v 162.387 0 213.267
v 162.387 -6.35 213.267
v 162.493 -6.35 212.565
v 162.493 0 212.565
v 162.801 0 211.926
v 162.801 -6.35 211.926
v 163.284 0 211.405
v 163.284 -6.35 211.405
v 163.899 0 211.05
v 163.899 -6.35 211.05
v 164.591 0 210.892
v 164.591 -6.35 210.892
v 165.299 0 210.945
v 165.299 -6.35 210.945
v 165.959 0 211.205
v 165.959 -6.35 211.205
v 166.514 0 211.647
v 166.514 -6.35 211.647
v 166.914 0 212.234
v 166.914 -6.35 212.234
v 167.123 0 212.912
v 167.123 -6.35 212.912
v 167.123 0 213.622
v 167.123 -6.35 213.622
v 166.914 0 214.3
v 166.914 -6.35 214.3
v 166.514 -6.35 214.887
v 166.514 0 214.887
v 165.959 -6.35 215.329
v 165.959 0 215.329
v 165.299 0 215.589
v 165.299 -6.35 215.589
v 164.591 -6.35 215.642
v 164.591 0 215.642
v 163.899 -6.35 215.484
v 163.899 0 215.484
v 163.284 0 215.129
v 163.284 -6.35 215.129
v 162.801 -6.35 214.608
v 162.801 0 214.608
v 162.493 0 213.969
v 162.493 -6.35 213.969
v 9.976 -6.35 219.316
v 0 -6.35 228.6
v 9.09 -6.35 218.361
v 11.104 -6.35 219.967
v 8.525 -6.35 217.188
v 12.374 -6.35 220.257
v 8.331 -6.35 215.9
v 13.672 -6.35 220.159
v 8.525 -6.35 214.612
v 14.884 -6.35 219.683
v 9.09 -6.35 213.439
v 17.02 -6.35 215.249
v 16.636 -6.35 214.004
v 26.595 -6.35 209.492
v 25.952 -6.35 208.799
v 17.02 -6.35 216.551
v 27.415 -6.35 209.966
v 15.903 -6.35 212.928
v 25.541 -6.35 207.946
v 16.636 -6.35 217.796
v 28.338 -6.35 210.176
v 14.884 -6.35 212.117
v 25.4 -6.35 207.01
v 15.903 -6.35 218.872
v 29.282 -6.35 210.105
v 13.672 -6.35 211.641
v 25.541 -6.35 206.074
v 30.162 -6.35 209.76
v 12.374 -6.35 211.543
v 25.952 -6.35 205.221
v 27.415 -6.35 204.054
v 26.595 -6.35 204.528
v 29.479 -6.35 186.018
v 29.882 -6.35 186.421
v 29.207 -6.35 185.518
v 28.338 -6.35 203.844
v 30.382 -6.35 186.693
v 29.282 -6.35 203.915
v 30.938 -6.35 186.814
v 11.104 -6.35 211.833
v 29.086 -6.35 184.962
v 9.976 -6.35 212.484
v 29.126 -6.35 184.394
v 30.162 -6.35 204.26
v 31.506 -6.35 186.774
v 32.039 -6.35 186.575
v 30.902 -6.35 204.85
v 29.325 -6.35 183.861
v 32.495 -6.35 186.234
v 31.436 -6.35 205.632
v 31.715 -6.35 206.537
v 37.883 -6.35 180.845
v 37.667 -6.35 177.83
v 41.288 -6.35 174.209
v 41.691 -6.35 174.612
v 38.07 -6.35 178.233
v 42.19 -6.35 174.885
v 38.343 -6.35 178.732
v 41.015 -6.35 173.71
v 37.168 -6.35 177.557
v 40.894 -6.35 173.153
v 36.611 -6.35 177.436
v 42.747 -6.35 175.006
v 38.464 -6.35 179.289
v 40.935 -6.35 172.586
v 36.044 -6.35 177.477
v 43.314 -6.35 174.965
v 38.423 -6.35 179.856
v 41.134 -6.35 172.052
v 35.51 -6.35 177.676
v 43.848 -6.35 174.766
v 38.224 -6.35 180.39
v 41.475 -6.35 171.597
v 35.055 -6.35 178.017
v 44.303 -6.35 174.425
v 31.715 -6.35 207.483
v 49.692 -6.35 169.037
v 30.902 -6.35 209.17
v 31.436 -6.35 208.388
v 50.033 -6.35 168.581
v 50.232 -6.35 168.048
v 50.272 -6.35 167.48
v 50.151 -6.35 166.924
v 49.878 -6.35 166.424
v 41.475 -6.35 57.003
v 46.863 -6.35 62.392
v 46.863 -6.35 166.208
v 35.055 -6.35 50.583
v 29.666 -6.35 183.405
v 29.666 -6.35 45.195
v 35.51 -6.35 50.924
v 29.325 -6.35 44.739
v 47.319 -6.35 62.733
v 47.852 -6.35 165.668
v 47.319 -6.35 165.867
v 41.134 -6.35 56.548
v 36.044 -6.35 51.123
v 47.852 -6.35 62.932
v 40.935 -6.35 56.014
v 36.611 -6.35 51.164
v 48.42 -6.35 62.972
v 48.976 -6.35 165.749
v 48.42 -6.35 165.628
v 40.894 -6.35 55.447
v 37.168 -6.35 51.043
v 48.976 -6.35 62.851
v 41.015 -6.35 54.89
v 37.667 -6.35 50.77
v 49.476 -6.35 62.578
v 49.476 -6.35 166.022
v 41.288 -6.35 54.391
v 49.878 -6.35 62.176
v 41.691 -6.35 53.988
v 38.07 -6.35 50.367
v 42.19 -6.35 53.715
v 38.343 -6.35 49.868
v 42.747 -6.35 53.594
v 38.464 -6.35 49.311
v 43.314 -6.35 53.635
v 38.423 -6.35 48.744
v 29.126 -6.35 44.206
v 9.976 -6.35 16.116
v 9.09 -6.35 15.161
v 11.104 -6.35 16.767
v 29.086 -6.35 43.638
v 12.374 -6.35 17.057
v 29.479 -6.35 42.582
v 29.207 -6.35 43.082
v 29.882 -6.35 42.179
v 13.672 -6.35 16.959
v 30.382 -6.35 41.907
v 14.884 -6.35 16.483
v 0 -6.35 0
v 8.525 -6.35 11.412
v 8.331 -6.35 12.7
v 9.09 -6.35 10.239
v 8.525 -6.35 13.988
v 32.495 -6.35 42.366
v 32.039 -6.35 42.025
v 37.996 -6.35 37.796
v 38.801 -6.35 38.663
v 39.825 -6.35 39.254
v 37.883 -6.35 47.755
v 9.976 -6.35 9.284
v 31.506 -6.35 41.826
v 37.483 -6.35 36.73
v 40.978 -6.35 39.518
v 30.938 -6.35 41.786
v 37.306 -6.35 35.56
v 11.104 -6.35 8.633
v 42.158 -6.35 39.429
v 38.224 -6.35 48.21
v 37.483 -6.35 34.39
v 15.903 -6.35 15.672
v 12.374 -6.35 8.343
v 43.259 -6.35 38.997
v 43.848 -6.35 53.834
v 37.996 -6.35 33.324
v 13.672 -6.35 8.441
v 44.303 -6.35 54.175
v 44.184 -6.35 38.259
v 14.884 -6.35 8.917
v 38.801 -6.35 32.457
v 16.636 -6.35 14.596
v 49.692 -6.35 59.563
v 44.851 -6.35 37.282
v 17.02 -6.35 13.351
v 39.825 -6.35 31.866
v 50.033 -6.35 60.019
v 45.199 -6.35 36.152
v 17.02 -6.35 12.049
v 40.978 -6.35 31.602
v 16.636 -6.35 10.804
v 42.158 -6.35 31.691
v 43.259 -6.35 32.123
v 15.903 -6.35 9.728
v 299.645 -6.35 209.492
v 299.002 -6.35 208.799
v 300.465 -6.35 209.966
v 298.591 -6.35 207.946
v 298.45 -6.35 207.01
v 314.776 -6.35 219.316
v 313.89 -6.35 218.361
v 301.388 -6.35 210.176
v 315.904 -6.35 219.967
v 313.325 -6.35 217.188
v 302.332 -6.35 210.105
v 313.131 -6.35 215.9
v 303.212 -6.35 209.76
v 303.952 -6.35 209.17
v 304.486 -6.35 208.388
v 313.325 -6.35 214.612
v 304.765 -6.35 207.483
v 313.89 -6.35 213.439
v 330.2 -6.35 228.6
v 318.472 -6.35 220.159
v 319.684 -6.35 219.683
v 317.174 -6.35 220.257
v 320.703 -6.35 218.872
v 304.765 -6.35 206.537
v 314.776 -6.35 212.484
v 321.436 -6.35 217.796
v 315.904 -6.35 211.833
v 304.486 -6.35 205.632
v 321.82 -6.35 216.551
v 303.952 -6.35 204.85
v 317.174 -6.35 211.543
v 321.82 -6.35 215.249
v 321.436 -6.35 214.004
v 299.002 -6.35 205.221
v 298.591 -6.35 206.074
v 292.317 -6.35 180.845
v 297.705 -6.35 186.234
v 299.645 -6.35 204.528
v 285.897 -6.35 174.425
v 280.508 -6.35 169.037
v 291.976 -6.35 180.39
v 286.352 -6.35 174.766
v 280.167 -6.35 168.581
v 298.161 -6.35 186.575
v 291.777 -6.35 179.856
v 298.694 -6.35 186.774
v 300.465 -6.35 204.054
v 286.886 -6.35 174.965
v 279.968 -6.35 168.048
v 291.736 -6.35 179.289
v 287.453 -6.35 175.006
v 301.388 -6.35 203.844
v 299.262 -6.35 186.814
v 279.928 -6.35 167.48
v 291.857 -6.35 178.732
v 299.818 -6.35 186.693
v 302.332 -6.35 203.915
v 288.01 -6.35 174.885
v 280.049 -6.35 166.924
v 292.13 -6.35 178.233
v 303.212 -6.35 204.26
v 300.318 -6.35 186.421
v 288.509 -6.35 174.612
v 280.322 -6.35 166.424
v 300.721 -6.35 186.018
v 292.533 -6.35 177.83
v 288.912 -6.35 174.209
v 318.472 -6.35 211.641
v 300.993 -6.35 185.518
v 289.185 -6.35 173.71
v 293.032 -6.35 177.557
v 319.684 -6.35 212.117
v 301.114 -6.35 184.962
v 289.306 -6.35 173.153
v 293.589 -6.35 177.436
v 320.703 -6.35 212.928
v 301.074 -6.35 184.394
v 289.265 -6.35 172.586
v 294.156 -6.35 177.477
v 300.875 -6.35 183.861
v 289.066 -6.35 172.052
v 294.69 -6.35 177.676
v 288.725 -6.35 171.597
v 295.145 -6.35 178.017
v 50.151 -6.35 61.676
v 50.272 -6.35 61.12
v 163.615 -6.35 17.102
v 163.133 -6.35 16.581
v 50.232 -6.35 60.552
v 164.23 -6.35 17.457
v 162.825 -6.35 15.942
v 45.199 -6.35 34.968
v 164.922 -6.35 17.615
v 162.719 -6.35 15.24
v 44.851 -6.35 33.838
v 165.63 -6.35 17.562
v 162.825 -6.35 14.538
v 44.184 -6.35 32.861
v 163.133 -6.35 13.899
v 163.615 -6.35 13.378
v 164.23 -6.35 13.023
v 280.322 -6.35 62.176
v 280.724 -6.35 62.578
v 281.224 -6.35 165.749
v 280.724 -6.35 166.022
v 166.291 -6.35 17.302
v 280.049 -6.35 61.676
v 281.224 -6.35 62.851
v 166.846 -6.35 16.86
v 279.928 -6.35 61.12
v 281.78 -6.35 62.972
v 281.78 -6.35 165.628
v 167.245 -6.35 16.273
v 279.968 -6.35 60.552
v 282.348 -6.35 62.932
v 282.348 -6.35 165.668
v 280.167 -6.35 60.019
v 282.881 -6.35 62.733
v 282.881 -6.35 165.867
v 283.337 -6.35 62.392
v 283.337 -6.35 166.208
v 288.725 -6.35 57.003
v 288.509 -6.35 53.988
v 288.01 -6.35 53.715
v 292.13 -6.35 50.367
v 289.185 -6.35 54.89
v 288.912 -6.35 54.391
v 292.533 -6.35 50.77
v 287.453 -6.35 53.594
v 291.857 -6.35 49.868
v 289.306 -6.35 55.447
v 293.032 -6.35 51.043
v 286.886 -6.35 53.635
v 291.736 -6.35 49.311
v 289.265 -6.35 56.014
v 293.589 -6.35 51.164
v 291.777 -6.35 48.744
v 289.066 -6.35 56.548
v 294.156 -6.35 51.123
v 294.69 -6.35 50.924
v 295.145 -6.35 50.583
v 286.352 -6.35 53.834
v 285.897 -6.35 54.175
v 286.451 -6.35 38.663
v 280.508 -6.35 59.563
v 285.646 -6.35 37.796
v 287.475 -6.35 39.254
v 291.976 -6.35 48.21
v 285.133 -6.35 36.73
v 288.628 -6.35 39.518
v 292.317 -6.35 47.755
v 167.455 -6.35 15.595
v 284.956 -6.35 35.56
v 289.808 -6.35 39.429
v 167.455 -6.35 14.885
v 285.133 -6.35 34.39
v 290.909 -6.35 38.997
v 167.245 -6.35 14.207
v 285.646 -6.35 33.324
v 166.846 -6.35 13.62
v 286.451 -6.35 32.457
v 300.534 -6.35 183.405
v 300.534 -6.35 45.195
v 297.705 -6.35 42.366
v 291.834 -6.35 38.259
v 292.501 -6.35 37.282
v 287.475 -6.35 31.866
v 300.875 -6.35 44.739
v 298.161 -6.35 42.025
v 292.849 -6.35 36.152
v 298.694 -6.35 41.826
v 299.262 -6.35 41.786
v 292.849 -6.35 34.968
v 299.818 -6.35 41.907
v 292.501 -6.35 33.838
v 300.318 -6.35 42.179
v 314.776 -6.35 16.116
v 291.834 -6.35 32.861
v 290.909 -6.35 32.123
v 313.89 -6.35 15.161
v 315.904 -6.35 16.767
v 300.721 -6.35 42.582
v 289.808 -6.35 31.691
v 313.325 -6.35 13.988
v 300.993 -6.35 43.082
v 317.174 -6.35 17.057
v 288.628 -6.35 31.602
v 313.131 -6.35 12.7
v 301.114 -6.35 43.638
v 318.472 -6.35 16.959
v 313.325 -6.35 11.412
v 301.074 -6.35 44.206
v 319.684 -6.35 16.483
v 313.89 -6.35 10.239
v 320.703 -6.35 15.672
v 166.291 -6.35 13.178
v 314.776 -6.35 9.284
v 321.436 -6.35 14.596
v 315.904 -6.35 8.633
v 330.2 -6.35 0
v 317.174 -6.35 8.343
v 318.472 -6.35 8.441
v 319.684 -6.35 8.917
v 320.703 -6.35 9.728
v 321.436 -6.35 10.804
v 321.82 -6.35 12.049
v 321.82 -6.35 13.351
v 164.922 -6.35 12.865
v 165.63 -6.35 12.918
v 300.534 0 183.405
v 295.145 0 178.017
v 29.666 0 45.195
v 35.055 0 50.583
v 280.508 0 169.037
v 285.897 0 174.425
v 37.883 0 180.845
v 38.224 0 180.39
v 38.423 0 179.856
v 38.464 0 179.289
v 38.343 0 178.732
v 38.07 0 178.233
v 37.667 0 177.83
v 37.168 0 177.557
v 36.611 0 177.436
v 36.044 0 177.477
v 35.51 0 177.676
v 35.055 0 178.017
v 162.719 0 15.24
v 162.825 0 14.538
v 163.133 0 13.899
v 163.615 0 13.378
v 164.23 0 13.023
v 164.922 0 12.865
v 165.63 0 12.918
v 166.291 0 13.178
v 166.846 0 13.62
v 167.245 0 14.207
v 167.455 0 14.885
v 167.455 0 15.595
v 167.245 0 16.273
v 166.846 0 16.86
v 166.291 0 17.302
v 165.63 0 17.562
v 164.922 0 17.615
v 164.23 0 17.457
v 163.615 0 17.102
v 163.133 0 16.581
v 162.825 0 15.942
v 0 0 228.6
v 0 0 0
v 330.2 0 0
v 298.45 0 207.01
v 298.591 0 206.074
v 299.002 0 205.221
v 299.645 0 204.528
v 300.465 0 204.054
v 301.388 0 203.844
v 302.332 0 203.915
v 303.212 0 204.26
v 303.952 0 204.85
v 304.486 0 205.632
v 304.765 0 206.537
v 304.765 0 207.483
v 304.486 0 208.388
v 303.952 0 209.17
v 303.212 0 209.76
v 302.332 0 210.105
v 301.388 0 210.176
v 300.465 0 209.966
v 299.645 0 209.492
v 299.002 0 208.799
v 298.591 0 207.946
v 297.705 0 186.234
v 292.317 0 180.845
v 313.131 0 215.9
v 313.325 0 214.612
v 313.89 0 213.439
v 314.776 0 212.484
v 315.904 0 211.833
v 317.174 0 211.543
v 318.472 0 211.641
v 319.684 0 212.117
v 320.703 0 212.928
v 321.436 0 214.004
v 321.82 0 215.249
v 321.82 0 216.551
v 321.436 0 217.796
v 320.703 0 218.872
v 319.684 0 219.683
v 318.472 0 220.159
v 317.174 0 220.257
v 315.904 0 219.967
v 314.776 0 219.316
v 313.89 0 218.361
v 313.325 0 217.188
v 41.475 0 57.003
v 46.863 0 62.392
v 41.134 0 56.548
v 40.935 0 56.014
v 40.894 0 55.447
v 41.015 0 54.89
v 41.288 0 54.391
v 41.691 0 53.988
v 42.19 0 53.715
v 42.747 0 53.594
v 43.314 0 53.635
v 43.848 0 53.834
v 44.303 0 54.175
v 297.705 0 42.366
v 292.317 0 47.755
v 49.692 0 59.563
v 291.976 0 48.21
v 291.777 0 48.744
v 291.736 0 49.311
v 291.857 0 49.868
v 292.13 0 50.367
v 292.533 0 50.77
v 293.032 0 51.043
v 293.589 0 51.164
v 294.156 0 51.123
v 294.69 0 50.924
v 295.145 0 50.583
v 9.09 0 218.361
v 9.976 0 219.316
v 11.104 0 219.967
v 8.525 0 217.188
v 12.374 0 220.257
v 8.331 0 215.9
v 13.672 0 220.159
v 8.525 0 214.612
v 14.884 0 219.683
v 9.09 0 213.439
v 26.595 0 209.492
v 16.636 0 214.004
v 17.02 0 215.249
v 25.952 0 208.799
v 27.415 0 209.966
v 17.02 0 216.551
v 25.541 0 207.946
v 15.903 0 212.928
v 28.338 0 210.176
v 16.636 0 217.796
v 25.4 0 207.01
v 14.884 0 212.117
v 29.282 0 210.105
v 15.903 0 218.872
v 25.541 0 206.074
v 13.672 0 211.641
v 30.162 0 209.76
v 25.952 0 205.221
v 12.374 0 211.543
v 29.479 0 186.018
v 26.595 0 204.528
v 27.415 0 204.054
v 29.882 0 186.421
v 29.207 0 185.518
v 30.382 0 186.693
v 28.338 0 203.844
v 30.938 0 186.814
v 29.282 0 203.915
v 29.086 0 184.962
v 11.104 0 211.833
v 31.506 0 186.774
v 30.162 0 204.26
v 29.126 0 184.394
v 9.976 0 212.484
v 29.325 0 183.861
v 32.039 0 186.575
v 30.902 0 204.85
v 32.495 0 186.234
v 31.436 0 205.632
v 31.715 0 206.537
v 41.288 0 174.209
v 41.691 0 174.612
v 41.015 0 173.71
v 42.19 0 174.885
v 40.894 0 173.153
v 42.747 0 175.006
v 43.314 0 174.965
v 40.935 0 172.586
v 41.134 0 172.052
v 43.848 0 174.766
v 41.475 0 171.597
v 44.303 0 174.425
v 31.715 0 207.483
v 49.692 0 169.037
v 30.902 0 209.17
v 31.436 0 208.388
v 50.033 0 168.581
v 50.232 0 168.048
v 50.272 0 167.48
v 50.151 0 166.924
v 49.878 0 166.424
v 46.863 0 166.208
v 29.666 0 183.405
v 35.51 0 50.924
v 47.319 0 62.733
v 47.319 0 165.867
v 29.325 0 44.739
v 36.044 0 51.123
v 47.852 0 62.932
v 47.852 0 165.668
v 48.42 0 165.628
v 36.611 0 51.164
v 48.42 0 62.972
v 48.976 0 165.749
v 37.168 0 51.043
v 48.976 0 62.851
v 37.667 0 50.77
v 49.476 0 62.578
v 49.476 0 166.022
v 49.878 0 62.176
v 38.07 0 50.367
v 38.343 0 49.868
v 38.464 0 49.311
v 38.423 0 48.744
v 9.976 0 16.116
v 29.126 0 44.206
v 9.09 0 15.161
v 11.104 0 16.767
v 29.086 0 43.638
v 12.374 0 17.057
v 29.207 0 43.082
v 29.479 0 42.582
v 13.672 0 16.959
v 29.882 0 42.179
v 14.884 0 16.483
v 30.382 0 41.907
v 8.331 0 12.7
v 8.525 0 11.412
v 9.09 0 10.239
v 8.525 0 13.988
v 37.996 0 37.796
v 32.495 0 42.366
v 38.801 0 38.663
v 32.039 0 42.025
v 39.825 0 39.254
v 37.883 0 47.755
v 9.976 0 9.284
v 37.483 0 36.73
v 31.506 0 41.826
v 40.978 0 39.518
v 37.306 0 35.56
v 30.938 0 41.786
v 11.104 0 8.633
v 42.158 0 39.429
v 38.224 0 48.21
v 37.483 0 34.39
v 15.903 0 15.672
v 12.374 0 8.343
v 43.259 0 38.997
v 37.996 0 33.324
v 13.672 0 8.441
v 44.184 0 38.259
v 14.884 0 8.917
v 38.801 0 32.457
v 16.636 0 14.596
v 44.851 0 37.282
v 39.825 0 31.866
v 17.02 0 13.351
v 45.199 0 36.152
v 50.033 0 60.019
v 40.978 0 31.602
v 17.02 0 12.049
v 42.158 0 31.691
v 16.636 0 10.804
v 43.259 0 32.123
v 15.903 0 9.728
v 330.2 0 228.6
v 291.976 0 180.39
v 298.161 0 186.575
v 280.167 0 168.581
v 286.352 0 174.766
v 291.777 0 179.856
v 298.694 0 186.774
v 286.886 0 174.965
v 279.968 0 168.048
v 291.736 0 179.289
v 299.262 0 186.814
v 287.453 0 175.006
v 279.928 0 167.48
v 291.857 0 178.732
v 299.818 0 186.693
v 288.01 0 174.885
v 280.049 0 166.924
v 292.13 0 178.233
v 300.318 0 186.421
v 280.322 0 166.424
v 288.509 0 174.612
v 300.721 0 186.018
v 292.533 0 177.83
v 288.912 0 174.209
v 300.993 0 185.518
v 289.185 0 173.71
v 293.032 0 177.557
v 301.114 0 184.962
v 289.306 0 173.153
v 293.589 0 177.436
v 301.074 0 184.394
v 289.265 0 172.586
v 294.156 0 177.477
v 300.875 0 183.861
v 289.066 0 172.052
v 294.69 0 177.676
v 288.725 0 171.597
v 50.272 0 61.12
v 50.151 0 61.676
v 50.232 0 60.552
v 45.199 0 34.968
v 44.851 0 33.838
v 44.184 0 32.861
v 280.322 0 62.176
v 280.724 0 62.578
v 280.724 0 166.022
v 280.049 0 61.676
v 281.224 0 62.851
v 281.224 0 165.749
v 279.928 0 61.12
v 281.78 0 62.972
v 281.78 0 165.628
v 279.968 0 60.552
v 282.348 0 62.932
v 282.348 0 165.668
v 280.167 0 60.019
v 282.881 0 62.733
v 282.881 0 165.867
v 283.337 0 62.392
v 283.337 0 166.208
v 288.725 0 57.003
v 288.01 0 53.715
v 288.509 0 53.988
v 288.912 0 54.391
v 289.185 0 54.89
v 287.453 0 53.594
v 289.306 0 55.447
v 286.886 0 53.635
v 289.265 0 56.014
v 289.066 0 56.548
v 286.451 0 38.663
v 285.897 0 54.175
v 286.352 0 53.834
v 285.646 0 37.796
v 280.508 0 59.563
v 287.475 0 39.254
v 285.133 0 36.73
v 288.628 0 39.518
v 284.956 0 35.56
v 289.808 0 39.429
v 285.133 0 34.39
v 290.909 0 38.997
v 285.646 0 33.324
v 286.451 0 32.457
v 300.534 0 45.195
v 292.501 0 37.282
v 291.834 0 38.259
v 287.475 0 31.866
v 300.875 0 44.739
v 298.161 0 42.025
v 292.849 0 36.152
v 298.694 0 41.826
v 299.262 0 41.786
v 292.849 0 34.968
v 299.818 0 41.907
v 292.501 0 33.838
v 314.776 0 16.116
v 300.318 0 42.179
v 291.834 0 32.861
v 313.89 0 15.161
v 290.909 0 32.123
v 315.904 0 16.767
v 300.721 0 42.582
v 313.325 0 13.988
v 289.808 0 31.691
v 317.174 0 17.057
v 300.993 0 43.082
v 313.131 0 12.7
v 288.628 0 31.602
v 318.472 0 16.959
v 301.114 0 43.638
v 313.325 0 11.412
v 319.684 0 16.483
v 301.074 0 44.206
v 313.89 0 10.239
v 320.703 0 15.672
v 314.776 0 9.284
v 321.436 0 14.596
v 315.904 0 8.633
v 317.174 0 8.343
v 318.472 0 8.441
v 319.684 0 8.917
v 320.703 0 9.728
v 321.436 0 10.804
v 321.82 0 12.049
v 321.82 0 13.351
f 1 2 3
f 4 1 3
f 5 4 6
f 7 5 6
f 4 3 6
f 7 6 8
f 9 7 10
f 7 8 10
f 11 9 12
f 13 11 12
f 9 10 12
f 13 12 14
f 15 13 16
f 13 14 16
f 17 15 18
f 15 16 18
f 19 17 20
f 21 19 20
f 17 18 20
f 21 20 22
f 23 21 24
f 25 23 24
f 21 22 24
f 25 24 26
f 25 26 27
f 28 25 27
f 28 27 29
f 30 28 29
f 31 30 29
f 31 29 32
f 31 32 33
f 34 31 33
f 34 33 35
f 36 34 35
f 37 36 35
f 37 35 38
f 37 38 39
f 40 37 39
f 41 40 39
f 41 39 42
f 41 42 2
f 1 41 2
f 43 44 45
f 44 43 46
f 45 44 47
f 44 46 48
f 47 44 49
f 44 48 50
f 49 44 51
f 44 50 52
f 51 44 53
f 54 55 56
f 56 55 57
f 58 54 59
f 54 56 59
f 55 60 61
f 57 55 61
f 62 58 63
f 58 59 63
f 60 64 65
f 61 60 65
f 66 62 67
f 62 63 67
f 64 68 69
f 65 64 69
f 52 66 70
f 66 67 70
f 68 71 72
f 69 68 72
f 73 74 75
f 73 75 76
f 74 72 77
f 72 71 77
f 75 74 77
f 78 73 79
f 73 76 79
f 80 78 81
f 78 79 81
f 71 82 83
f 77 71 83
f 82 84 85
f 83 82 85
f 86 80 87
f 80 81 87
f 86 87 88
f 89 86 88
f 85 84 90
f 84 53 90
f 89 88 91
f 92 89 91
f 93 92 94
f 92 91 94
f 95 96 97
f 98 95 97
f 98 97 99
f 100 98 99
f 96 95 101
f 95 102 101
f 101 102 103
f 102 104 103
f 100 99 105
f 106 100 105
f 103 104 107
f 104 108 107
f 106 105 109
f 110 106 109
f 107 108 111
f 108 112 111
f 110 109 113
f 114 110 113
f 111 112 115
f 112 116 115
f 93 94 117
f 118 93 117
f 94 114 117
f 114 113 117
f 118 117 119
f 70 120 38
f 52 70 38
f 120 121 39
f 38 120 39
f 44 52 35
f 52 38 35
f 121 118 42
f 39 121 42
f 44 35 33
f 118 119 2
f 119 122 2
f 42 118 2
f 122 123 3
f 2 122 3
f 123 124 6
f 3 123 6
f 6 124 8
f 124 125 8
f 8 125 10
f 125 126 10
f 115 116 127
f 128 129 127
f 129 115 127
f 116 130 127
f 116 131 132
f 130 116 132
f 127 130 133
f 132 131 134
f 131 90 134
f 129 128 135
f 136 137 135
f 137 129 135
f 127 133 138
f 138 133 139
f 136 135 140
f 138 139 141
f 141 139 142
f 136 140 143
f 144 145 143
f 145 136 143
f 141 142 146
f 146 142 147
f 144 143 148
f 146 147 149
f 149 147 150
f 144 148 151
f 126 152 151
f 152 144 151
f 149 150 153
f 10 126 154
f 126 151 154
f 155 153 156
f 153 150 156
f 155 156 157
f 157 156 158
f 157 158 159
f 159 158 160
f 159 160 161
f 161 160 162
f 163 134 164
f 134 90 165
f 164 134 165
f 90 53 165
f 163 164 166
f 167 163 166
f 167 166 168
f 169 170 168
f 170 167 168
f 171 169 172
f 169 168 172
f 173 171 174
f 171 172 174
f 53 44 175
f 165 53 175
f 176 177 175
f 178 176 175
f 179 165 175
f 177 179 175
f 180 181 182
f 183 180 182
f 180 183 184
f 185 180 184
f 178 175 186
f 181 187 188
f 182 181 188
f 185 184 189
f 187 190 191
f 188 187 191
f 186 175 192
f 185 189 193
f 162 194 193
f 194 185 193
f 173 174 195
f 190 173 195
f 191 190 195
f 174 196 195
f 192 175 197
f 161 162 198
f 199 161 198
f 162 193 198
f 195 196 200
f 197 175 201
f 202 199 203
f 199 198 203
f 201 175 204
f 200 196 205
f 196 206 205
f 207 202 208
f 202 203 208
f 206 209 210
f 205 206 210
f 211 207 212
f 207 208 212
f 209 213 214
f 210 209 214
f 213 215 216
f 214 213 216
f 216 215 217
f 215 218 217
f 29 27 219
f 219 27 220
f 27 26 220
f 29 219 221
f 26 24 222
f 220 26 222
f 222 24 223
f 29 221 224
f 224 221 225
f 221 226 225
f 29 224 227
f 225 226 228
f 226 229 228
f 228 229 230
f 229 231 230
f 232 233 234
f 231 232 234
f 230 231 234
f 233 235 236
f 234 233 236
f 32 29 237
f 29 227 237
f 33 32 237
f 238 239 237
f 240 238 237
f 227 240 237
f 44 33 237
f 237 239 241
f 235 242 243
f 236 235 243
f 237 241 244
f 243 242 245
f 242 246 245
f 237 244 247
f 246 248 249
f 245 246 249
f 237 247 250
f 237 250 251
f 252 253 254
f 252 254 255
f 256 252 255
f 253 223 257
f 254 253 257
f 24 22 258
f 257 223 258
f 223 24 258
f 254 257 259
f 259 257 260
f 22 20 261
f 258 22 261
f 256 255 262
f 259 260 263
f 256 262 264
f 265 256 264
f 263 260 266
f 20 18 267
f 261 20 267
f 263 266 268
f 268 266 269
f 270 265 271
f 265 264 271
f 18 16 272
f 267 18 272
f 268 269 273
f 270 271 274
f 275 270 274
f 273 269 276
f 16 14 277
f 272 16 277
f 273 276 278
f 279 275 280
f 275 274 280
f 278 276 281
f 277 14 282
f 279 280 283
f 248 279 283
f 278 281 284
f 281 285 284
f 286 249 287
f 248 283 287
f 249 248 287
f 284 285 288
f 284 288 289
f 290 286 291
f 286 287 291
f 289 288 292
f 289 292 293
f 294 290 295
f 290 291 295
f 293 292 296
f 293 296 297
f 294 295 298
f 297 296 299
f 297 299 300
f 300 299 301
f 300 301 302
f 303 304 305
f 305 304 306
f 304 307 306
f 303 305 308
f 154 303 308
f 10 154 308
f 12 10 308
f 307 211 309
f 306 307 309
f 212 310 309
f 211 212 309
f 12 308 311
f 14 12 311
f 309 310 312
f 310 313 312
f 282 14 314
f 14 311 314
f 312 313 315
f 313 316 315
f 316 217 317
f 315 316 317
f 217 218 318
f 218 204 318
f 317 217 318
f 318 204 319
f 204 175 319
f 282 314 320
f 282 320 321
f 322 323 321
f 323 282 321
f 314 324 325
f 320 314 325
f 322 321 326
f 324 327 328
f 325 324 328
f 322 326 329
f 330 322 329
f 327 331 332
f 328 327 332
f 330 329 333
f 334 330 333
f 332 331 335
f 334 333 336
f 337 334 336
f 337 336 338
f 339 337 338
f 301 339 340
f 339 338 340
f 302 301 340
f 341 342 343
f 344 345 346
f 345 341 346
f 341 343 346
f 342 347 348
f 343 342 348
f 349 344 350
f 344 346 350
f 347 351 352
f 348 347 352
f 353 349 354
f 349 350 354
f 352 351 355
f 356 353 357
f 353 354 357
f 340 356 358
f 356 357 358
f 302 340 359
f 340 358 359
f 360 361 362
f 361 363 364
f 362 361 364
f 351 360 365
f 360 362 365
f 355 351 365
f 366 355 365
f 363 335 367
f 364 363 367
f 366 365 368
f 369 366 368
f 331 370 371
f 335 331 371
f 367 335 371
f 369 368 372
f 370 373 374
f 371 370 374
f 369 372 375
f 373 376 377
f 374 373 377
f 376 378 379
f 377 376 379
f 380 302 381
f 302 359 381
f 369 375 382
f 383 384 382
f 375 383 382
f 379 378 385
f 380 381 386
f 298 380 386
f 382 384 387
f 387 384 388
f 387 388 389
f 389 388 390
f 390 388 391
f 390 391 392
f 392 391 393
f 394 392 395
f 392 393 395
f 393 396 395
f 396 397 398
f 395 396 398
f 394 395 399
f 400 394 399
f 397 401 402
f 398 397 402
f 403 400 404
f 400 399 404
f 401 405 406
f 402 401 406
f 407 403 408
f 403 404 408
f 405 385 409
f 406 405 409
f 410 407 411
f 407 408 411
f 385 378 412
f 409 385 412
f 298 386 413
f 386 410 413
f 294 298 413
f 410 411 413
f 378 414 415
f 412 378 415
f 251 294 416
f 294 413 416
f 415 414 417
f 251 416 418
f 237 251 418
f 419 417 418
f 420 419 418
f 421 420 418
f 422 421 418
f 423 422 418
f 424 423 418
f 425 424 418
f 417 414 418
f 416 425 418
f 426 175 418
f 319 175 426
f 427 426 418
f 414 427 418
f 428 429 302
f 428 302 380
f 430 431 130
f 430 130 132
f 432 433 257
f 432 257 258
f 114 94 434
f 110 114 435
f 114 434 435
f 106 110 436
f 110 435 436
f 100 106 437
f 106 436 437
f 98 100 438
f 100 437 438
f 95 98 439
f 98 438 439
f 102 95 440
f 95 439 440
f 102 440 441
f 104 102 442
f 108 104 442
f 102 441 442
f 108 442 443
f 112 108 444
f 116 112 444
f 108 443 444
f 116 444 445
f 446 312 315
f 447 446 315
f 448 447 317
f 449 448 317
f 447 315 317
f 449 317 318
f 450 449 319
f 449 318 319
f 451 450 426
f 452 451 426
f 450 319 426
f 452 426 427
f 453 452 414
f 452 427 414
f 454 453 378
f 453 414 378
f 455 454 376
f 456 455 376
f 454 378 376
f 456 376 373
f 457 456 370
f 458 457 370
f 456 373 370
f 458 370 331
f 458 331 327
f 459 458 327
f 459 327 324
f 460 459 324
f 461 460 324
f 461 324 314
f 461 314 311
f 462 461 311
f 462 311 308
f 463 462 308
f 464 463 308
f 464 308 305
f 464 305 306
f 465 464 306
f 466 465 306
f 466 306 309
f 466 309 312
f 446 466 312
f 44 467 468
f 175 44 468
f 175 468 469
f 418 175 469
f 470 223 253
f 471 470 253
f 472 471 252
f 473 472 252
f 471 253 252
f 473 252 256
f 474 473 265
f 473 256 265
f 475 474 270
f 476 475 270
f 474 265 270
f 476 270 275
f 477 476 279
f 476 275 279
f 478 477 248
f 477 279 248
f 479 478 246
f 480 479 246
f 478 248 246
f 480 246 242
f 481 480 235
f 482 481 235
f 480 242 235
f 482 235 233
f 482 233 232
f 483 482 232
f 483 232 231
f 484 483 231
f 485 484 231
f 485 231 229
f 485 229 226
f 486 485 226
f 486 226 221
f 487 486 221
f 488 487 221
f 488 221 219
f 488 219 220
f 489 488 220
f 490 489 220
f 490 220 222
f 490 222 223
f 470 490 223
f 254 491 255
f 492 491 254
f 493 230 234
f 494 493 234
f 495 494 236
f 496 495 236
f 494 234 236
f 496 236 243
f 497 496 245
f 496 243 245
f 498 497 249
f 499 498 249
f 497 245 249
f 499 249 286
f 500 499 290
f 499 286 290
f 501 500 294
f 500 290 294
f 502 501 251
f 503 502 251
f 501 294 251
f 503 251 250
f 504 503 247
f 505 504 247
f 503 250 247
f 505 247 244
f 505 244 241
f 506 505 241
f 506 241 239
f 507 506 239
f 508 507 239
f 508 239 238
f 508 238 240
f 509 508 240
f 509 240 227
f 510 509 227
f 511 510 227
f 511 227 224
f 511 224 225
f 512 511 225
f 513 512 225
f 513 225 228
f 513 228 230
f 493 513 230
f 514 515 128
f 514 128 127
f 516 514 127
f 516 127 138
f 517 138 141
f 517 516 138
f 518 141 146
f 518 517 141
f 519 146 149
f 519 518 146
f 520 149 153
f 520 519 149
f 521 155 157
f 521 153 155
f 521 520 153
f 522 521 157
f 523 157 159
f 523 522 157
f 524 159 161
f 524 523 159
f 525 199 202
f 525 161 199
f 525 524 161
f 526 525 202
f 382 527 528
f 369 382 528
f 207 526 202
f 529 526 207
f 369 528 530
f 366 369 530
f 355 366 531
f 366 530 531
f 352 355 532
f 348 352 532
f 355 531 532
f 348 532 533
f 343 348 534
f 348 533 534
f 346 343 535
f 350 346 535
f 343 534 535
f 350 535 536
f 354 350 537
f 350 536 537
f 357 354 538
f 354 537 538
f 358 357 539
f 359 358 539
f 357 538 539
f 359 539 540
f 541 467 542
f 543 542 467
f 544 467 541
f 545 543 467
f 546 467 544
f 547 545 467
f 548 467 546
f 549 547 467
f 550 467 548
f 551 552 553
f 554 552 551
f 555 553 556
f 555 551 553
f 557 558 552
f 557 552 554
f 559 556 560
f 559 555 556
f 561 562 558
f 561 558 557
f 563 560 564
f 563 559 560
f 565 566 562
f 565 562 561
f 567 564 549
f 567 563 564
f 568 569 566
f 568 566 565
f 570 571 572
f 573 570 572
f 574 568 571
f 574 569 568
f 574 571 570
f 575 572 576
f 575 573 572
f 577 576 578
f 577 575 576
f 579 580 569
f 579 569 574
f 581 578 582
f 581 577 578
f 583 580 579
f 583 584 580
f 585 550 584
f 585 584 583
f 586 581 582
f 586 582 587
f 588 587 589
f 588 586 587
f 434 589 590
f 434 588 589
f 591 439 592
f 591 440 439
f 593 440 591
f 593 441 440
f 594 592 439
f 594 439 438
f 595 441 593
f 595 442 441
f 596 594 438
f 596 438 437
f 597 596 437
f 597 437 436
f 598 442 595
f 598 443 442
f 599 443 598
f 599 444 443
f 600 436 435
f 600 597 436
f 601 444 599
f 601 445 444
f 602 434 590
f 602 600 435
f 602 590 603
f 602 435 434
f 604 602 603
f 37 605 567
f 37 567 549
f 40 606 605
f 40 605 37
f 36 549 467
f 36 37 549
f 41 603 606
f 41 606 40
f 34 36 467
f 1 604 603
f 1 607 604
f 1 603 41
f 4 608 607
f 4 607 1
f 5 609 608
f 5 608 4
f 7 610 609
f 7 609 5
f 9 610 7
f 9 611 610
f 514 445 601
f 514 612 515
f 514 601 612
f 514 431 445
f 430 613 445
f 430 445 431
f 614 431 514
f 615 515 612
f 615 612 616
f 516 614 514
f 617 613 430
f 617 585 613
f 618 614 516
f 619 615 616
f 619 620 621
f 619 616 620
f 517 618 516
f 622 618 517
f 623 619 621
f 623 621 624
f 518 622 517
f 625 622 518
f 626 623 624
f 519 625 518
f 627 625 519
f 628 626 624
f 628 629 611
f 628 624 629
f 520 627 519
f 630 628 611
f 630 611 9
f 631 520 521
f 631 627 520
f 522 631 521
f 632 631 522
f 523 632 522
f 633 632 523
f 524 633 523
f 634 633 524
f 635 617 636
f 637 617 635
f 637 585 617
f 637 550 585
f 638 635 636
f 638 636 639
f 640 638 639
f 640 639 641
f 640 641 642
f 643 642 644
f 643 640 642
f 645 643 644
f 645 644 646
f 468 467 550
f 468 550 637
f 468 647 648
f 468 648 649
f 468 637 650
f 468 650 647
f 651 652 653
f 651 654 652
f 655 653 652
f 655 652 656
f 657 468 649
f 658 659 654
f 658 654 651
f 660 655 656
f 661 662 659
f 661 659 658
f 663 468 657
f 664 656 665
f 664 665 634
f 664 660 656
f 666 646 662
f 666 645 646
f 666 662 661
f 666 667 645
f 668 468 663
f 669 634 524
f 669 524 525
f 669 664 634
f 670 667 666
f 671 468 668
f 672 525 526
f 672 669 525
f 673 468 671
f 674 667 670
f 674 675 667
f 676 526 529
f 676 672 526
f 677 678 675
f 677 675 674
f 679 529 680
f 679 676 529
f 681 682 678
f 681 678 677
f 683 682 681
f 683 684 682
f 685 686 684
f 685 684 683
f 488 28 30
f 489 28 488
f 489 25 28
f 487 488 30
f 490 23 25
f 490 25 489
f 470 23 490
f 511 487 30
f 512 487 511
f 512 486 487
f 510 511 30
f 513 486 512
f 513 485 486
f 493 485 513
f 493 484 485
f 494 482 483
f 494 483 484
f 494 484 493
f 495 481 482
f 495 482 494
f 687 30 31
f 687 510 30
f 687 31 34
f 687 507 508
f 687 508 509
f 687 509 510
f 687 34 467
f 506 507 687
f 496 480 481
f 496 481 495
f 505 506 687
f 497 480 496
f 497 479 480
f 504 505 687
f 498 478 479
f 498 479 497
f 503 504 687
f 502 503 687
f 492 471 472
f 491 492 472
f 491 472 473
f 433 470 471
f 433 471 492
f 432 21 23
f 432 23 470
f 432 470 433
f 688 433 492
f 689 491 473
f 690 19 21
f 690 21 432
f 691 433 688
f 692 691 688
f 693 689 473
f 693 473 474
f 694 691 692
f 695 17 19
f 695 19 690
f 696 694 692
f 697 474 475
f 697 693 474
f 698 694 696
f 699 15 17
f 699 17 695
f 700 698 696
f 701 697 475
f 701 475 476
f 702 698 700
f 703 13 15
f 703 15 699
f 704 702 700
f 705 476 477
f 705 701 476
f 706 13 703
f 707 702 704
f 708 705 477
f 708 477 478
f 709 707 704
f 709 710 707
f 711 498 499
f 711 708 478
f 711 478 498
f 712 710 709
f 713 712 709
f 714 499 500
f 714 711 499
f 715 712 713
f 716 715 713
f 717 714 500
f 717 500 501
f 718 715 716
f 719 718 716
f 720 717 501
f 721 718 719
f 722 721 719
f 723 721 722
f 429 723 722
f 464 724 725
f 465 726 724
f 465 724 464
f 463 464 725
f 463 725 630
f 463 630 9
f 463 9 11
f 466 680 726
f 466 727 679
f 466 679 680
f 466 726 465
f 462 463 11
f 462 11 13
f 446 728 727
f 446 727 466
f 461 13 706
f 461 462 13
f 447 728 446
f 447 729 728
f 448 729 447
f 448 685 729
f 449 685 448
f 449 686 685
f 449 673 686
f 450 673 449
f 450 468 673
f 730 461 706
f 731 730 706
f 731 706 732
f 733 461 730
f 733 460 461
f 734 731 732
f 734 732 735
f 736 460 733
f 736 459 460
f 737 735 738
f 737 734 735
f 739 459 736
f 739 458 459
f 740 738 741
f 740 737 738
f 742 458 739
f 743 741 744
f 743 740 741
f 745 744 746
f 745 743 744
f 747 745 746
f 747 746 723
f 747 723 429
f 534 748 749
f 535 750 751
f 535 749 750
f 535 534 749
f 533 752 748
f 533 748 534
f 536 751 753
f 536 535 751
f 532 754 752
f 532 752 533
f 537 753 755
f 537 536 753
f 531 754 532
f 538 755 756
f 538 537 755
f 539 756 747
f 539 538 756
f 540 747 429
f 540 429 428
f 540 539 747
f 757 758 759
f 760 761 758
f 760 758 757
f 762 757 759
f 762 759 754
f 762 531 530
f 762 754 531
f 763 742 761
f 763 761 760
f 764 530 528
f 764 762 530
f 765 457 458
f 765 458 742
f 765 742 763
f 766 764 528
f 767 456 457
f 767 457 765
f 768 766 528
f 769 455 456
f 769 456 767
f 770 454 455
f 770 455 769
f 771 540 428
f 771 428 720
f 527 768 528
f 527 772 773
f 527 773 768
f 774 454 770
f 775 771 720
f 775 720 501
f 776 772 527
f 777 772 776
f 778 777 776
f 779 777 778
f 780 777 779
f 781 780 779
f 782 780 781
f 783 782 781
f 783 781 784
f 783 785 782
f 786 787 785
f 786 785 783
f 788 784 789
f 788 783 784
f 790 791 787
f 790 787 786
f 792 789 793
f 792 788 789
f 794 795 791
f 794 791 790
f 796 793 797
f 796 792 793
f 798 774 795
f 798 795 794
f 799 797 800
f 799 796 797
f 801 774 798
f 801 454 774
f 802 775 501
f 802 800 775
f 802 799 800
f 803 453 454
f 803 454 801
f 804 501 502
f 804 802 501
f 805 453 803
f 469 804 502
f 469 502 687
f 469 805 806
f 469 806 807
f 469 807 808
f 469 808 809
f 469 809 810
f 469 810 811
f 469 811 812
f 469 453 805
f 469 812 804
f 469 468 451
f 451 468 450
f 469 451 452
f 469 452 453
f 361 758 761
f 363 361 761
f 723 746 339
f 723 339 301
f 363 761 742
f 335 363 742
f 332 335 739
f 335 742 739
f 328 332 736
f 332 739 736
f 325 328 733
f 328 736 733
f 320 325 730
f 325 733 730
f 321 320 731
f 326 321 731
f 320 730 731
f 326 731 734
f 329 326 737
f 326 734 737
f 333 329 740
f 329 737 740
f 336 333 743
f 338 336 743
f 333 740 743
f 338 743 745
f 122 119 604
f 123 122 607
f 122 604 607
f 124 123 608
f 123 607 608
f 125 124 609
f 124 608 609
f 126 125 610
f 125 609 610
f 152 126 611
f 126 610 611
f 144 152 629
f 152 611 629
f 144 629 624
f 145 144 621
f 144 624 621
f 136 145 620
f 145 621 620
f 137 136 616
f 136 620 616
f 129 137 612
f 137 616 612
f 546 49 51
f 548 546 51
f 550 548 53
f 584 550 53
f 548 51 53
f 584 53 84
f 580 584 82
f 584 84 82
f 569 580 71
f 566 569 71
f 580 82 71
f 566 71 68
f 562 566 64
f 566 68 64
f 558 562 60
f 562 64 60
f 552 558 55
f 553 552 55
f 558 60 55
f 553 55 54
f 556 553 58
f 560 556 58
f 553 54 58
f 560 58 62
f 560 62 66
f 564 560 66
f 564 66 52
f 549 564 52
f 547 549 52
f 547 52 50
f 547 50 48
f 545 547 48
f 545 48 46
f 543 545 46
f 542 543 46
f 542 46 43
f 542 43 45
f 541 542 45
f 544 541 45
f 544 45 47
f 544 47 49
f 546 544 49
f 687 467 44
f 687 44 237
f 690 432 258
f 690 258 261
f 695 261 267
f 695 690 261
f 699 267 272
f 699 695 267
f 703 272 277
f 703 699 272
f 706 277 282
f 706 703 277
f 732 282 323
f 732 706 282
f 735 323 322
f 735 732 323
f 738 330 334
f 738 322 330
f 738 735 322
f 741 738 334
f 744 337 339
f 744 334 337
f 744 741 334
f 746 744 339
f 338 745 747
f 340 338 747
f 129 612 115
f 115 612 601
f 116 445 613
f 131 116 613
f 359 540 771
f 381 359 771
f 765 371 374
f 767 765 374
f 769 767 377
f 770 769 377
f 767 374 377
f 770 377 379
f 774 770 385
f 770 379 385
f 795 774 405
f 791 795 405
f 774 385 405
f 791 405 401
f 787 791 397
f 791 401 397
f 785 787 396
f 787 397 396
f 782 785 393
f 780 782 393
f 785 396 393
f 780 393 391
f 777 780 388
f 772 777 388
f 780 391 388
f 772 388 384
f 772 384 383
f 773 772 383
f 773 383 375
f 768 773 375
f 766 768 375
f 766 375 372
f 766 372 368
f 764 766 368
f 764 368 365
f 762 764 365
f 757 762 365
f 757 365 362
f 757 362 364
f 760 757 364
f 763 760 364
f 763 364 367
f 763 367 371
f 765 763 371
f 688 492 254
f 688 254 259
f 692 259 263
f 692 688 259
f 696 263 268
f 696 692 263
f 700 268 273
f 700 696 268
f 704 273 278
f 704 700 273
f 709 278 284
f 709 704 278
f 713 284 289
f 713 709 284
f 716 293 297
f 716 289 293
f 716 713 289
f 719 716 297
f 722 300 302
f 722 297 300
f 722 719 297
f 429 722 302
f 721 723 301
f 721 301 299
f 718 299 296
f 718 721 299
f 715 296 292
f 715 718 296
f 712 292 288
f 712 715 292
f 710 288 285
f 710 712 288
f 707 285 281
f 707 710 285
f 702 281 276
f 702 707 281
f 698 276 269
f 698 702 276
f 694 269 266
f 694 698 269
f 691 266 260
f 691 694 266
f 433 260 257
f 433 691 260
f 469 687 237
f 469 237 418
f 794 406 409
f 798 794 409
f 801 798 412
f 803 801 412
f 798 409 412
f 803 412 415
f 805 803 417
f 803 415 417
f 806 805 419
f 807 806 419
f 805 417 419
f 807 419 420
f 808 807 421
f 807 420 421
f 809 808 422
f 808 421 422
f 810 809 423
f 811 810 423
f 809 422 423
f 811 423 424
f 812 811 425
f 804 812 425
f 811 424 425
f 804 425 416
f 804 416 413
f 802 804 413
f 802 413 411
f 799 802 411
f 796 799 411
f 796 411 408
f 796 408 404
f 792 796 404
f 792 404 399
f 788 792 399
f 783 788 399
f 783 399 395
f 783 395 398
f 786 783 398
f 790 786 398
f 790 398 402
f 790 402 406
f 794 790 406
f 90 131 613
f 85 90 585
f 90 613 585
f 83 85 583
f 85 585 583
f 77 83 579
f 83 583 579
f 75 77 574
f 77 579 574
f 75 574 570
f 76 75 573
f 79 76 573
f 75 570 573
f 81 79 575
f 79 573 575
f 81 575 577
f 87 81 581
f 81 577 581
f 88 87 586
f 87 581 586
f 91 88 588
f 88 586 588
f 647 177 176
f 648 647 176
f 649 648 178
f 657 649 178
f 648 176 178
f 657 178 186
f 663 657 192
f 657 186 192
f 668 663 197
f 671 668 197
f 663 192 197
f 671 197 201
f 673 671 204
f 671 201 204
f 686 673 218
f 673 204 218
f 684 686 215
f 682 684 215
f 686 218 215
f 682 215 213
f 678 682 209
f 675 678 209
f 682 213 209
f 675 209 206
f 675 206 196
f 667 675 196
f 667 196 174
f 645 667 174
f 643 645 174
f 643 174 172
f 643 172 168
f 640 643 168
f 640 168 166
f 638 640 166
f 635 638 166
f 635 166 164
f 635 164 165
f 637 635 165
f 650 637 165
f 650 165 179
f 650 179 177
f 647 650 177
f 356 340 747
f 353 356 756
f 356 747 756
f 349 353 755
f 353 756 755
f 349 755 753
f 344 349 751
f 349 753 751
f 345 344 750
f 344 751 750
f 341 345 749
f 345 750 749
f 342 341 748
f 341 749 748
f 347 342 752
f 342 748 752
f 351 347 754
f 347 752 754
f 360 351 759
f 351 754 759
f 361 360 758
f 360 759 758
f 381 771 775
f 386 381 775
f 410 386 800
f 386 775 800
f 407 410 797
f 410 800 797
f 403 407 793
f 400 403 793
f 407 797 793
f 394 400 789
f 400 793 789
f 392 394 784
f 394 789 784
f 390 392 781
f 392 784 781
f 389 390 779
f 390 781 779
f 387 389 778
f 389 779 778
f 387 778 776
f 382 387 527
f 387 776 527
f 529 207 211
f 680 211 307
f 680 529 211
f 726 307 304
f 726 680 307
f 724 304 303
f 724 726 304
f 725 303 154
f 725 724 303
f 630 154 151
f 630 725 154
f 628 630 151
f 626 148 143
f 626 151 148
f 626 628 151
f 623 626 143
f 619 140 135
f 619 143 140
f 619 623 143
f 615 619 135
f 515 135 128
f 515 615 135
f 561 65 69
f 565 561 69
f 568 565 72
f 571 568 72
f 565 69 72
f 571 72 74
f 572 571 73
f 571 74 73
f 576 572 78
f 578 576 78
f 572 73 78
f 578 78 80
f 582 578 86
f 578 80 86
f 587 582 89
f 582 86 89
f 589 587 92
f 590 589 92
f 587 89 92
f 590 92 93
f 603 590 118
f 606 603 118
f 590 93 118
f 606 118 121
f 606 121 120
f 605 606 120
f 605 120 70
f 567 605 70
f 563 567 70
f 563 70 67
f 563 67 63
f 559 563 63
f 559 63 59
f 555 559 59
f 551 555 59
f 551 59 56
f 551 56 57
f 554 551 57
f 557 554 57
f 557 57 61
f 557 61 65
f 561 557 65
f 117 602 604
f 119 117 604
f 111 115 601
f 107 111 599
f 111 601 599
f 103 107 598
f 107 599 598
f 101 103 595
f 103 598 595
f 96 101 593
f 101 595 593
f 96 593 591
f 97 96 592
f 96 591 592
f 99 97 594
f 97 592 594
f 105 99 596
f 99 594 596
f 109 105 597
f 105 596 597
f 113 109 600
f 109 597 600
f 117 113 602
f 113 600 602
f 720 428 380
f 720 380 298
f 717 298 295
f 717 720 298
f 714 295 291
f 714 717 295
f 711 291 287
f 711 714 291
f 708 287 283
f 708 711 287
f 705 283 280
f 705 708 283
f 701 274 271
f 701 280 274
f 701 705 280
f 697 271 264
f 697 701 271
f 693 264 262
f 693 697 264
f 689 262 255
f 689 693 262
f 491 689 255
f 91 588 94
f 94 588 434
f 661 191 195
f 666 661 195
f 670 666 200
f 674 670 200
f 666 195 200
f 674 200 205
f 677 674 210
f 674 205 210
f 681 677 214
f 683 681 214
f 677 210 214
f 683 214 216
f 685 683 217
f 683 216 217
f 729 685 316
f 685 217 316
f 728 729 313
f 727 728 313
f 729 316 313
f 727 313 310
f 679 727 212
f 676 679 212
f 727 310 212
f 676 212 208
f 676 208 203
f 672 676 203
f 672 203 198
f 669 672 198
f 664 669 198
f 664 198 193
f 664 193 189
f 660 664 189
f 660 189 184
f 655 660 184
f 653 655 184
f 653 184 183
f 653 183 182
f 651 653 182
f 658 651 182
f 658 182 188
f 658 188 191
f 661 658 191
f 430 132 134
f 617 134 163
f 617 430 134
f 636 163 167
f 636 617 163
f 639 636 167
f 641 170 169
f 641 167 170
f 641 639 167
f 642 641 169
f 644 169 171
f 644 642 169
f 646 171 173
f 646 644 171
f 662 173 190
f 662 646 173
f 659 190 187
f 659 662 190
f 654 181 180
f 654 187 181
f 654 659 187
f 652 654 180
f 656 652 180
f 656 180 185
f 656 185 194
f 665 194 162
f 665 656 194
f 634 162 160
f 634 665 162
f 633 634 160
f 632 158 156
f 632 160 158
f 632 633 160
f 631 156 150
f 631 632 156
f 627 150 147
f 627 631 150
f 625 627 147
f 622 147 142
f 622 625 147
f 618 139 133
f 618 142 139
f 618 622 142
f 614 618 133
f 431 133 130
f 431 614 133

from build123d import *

# Parameters (mm, degrees)
SKETCH1_W                      = 330.2
SKETCH1_H                      = 228.6
BASE_PLATE_DEPTH               = 6.35
SLOTS_DEPTH                    = 7.35
FEET_CONNECTION_HOLE_D         = 8.7376
F_1_4_0_25_DIAMETER_HOLE1_D    = 6.35
F_5_16_0_3125_DIAMETER_HOLE1_D = 7.9375
ESD_CONNECTION_HOLE_D          = 4.7625


with BuildPart() as part:
    # Sketch1 → base plate (new body)
    with BuildSketch(Plane(origin=(0, 0, 0), x_dir=(1, 0, 0), z_dir=(0, 1, 0))):
        with Locations((165.1, -114.3)):
            Rectangle(SKETCH1_W, SKETCH1_H)
    extrude(amount=-BASE_PLATE_DEPTH)

    # Sketch3 → slots (cut, through all)
    with BuildSketch(Plane(origin=(0, 0, 0), x_dir=(1, 0, 0), z_dir=(0, 1, 0))):
        with BuildLine():
            ThreePointArc((37.882935507, -47.754508291), (37.882935507, -50.582935507), (35.054508291, -50.582935507))
            Line((35.054508291, -50.582935507), (29.666354619, -45.194781834))
            ThreePointArc((29.666354619, -45.194781834), (29.666354619, -42.366354619), (32.494781834, -42.366354619))
            Line((32.494781834, -42.366354619), (37.882935507, -47.754508291))
        make_face()
        with BuildLine():
            Line((297.705218166, -42.366354619), (292.317064493, -47.754508291))
            ThreePointArc((292.317064493, -47.754508291), (292.317064493, -50.582935507), (295.145491709, -50.582935507))
            Line((295.145491709, -50.582935507), (300.533645381, -45.194781834))
            ThreePointArc((300.533645381, -45.194781834), (300.533645381, -42.366354619), (297.705218166, -42.366354619))
        make_face()
        with BuildLine():
            Line((283.336808372, -62.391618843), (288.724962045, -57.00346517))
            ThreePointArc((288.724962045, -57.00346517), (288.724962045, -54.175037955), (285.89653483, -54.175037955))
            Line((285.89653483, -54.175037955), (280.508381157, -59.563191628))
            ThreePointArc((280.508381157, -59.563191628), (280.508381157, -62.391618843), (283.336808372, -62.391618843))
        make_face()
        with BuildLine():
            ThreePointArc((288.724962045, -171.59653483), (288.724962045, -174.424962045), (285.89653483, -174.424962045))
            Line((285.89653483, -174.424962045), (280.508381157, -169.036808372))
            ThreePointArc((280.508381157, -169.036808372), (280.508381157, -166.208381157), (283.336808372, -166.208381157))
            Line((283.336808372, -166.208381157), (288.724962045, -171.59653483))
        make_face()
        with BuildLine():
            ThreePointArc((292.317064493, -180.845491709), (292.317064493, -178.017064493), (295.145491709, -178.017064493))
            Line((295.145491709, -178.017064493), (300.533645381, -183.405218166))
            ThreePointArc((300.533645381, -183.405218166), (300.533645381, -186.233645381), (297.705218166, -186.233645381))
            Line((297.705218166, -186.233645381), (292.317064493, -180.845491709))
        make_face()
        with BuildLine():
            Line((32.494781834, -186.233645381), (37.882935507, -180.845491709))
            ThreePointArc((37.882935507, -180.845491709), (37.882935507, -178.017064493), (35.054508291, -178.017064493))
            Line((35.054508291, -178.017064493), (29.666354619, -183.405218166))
            ThreePointArc((29.666354619, -183.405218166), (29.666354619, -186.233645381), (32.494781834, -186.233645381))
        make_face()
        with BuildLine():
            Line((46.863191628, -166.208381157), (41.475037955, -171.59653483))
            ThreePointArc((41.475037955, -171.59653483), (41.475037955, -174.424962045), (44.30346517, -174.424962045))
            Line((44.30346517, -174.424962045), (49.691618843, -169.036808372))
            ThreePointArc((49.691618843, -169.036808372), (49.691618843, -166.208381157), (46.863191628, -166.208381157))
        make_face()
        with BuildLine():
            Line((46.863191628, -62.391618843), (41.475037955, -57.00346517))
            ThreePointArc((41.475037955, -57.00346517), (41.475037955, -54.175037955), (44.30346517, -54.175037955))
            Line((44.30346517, -54.175037955), (49.691618843, -59.563191628))
            ThreePointArc((49.691618843, -59.563191628), (49.691618843, -62.391618843), (46.863191628, -62.391618843))
        make_face()
    extrude(amount=-SLOTS_DEPTH, mode=Mode.SUBTRACT)

    # Feet connection hole (through all)
    with Locations(Plane(origin=(0, 0, 0), x_dir=(1, 0, 0), z_dir=(0, 1, 0))):
        with Locations((12.7, -215.9), (317.5, -12.7), (317.5, -215.9), (12.7, -12.7)):
            Hole(FEET_CONNECTION_HOLE_D / 2)

    # 1/4 (0.25) Diameter Hole1 (through all)
    with Locations(Plane(origin=(0, 0, 0), x_dir=(1, 0, 0), z_dir=(0, 1, 0))):
        with Locations((28.575, -207.01), (301.625, -207.01)):
            Hole(F_1_4_0_25_DIAMETER_HOLE1_D / 2)

    # 5/16 (0.3125) Diameter Hole1 (through all)
    with Locations(Plane(origin=(0, 0, 0), x_dir=(1, 0, 0), z_dir=(0, 1, 0))):
        with Locations((41.275, -35.56), (288.925, -35.56)):
            Hole(F_5_16_0_3125_DIAMETER_HOLE1_D / 2)

    # ESD Connection hole (through all)
    with Locations(Plane(origin=(0, 0, 0), x_dir=(1, 0, 0), z_dir=(0, 1, 0))):
        with Locations((165.1, -15.24), (164.768662044, -213.266978445)):
            Hole(ESD_CONNECTION_HOLE_D / 2)


solid = part.part
